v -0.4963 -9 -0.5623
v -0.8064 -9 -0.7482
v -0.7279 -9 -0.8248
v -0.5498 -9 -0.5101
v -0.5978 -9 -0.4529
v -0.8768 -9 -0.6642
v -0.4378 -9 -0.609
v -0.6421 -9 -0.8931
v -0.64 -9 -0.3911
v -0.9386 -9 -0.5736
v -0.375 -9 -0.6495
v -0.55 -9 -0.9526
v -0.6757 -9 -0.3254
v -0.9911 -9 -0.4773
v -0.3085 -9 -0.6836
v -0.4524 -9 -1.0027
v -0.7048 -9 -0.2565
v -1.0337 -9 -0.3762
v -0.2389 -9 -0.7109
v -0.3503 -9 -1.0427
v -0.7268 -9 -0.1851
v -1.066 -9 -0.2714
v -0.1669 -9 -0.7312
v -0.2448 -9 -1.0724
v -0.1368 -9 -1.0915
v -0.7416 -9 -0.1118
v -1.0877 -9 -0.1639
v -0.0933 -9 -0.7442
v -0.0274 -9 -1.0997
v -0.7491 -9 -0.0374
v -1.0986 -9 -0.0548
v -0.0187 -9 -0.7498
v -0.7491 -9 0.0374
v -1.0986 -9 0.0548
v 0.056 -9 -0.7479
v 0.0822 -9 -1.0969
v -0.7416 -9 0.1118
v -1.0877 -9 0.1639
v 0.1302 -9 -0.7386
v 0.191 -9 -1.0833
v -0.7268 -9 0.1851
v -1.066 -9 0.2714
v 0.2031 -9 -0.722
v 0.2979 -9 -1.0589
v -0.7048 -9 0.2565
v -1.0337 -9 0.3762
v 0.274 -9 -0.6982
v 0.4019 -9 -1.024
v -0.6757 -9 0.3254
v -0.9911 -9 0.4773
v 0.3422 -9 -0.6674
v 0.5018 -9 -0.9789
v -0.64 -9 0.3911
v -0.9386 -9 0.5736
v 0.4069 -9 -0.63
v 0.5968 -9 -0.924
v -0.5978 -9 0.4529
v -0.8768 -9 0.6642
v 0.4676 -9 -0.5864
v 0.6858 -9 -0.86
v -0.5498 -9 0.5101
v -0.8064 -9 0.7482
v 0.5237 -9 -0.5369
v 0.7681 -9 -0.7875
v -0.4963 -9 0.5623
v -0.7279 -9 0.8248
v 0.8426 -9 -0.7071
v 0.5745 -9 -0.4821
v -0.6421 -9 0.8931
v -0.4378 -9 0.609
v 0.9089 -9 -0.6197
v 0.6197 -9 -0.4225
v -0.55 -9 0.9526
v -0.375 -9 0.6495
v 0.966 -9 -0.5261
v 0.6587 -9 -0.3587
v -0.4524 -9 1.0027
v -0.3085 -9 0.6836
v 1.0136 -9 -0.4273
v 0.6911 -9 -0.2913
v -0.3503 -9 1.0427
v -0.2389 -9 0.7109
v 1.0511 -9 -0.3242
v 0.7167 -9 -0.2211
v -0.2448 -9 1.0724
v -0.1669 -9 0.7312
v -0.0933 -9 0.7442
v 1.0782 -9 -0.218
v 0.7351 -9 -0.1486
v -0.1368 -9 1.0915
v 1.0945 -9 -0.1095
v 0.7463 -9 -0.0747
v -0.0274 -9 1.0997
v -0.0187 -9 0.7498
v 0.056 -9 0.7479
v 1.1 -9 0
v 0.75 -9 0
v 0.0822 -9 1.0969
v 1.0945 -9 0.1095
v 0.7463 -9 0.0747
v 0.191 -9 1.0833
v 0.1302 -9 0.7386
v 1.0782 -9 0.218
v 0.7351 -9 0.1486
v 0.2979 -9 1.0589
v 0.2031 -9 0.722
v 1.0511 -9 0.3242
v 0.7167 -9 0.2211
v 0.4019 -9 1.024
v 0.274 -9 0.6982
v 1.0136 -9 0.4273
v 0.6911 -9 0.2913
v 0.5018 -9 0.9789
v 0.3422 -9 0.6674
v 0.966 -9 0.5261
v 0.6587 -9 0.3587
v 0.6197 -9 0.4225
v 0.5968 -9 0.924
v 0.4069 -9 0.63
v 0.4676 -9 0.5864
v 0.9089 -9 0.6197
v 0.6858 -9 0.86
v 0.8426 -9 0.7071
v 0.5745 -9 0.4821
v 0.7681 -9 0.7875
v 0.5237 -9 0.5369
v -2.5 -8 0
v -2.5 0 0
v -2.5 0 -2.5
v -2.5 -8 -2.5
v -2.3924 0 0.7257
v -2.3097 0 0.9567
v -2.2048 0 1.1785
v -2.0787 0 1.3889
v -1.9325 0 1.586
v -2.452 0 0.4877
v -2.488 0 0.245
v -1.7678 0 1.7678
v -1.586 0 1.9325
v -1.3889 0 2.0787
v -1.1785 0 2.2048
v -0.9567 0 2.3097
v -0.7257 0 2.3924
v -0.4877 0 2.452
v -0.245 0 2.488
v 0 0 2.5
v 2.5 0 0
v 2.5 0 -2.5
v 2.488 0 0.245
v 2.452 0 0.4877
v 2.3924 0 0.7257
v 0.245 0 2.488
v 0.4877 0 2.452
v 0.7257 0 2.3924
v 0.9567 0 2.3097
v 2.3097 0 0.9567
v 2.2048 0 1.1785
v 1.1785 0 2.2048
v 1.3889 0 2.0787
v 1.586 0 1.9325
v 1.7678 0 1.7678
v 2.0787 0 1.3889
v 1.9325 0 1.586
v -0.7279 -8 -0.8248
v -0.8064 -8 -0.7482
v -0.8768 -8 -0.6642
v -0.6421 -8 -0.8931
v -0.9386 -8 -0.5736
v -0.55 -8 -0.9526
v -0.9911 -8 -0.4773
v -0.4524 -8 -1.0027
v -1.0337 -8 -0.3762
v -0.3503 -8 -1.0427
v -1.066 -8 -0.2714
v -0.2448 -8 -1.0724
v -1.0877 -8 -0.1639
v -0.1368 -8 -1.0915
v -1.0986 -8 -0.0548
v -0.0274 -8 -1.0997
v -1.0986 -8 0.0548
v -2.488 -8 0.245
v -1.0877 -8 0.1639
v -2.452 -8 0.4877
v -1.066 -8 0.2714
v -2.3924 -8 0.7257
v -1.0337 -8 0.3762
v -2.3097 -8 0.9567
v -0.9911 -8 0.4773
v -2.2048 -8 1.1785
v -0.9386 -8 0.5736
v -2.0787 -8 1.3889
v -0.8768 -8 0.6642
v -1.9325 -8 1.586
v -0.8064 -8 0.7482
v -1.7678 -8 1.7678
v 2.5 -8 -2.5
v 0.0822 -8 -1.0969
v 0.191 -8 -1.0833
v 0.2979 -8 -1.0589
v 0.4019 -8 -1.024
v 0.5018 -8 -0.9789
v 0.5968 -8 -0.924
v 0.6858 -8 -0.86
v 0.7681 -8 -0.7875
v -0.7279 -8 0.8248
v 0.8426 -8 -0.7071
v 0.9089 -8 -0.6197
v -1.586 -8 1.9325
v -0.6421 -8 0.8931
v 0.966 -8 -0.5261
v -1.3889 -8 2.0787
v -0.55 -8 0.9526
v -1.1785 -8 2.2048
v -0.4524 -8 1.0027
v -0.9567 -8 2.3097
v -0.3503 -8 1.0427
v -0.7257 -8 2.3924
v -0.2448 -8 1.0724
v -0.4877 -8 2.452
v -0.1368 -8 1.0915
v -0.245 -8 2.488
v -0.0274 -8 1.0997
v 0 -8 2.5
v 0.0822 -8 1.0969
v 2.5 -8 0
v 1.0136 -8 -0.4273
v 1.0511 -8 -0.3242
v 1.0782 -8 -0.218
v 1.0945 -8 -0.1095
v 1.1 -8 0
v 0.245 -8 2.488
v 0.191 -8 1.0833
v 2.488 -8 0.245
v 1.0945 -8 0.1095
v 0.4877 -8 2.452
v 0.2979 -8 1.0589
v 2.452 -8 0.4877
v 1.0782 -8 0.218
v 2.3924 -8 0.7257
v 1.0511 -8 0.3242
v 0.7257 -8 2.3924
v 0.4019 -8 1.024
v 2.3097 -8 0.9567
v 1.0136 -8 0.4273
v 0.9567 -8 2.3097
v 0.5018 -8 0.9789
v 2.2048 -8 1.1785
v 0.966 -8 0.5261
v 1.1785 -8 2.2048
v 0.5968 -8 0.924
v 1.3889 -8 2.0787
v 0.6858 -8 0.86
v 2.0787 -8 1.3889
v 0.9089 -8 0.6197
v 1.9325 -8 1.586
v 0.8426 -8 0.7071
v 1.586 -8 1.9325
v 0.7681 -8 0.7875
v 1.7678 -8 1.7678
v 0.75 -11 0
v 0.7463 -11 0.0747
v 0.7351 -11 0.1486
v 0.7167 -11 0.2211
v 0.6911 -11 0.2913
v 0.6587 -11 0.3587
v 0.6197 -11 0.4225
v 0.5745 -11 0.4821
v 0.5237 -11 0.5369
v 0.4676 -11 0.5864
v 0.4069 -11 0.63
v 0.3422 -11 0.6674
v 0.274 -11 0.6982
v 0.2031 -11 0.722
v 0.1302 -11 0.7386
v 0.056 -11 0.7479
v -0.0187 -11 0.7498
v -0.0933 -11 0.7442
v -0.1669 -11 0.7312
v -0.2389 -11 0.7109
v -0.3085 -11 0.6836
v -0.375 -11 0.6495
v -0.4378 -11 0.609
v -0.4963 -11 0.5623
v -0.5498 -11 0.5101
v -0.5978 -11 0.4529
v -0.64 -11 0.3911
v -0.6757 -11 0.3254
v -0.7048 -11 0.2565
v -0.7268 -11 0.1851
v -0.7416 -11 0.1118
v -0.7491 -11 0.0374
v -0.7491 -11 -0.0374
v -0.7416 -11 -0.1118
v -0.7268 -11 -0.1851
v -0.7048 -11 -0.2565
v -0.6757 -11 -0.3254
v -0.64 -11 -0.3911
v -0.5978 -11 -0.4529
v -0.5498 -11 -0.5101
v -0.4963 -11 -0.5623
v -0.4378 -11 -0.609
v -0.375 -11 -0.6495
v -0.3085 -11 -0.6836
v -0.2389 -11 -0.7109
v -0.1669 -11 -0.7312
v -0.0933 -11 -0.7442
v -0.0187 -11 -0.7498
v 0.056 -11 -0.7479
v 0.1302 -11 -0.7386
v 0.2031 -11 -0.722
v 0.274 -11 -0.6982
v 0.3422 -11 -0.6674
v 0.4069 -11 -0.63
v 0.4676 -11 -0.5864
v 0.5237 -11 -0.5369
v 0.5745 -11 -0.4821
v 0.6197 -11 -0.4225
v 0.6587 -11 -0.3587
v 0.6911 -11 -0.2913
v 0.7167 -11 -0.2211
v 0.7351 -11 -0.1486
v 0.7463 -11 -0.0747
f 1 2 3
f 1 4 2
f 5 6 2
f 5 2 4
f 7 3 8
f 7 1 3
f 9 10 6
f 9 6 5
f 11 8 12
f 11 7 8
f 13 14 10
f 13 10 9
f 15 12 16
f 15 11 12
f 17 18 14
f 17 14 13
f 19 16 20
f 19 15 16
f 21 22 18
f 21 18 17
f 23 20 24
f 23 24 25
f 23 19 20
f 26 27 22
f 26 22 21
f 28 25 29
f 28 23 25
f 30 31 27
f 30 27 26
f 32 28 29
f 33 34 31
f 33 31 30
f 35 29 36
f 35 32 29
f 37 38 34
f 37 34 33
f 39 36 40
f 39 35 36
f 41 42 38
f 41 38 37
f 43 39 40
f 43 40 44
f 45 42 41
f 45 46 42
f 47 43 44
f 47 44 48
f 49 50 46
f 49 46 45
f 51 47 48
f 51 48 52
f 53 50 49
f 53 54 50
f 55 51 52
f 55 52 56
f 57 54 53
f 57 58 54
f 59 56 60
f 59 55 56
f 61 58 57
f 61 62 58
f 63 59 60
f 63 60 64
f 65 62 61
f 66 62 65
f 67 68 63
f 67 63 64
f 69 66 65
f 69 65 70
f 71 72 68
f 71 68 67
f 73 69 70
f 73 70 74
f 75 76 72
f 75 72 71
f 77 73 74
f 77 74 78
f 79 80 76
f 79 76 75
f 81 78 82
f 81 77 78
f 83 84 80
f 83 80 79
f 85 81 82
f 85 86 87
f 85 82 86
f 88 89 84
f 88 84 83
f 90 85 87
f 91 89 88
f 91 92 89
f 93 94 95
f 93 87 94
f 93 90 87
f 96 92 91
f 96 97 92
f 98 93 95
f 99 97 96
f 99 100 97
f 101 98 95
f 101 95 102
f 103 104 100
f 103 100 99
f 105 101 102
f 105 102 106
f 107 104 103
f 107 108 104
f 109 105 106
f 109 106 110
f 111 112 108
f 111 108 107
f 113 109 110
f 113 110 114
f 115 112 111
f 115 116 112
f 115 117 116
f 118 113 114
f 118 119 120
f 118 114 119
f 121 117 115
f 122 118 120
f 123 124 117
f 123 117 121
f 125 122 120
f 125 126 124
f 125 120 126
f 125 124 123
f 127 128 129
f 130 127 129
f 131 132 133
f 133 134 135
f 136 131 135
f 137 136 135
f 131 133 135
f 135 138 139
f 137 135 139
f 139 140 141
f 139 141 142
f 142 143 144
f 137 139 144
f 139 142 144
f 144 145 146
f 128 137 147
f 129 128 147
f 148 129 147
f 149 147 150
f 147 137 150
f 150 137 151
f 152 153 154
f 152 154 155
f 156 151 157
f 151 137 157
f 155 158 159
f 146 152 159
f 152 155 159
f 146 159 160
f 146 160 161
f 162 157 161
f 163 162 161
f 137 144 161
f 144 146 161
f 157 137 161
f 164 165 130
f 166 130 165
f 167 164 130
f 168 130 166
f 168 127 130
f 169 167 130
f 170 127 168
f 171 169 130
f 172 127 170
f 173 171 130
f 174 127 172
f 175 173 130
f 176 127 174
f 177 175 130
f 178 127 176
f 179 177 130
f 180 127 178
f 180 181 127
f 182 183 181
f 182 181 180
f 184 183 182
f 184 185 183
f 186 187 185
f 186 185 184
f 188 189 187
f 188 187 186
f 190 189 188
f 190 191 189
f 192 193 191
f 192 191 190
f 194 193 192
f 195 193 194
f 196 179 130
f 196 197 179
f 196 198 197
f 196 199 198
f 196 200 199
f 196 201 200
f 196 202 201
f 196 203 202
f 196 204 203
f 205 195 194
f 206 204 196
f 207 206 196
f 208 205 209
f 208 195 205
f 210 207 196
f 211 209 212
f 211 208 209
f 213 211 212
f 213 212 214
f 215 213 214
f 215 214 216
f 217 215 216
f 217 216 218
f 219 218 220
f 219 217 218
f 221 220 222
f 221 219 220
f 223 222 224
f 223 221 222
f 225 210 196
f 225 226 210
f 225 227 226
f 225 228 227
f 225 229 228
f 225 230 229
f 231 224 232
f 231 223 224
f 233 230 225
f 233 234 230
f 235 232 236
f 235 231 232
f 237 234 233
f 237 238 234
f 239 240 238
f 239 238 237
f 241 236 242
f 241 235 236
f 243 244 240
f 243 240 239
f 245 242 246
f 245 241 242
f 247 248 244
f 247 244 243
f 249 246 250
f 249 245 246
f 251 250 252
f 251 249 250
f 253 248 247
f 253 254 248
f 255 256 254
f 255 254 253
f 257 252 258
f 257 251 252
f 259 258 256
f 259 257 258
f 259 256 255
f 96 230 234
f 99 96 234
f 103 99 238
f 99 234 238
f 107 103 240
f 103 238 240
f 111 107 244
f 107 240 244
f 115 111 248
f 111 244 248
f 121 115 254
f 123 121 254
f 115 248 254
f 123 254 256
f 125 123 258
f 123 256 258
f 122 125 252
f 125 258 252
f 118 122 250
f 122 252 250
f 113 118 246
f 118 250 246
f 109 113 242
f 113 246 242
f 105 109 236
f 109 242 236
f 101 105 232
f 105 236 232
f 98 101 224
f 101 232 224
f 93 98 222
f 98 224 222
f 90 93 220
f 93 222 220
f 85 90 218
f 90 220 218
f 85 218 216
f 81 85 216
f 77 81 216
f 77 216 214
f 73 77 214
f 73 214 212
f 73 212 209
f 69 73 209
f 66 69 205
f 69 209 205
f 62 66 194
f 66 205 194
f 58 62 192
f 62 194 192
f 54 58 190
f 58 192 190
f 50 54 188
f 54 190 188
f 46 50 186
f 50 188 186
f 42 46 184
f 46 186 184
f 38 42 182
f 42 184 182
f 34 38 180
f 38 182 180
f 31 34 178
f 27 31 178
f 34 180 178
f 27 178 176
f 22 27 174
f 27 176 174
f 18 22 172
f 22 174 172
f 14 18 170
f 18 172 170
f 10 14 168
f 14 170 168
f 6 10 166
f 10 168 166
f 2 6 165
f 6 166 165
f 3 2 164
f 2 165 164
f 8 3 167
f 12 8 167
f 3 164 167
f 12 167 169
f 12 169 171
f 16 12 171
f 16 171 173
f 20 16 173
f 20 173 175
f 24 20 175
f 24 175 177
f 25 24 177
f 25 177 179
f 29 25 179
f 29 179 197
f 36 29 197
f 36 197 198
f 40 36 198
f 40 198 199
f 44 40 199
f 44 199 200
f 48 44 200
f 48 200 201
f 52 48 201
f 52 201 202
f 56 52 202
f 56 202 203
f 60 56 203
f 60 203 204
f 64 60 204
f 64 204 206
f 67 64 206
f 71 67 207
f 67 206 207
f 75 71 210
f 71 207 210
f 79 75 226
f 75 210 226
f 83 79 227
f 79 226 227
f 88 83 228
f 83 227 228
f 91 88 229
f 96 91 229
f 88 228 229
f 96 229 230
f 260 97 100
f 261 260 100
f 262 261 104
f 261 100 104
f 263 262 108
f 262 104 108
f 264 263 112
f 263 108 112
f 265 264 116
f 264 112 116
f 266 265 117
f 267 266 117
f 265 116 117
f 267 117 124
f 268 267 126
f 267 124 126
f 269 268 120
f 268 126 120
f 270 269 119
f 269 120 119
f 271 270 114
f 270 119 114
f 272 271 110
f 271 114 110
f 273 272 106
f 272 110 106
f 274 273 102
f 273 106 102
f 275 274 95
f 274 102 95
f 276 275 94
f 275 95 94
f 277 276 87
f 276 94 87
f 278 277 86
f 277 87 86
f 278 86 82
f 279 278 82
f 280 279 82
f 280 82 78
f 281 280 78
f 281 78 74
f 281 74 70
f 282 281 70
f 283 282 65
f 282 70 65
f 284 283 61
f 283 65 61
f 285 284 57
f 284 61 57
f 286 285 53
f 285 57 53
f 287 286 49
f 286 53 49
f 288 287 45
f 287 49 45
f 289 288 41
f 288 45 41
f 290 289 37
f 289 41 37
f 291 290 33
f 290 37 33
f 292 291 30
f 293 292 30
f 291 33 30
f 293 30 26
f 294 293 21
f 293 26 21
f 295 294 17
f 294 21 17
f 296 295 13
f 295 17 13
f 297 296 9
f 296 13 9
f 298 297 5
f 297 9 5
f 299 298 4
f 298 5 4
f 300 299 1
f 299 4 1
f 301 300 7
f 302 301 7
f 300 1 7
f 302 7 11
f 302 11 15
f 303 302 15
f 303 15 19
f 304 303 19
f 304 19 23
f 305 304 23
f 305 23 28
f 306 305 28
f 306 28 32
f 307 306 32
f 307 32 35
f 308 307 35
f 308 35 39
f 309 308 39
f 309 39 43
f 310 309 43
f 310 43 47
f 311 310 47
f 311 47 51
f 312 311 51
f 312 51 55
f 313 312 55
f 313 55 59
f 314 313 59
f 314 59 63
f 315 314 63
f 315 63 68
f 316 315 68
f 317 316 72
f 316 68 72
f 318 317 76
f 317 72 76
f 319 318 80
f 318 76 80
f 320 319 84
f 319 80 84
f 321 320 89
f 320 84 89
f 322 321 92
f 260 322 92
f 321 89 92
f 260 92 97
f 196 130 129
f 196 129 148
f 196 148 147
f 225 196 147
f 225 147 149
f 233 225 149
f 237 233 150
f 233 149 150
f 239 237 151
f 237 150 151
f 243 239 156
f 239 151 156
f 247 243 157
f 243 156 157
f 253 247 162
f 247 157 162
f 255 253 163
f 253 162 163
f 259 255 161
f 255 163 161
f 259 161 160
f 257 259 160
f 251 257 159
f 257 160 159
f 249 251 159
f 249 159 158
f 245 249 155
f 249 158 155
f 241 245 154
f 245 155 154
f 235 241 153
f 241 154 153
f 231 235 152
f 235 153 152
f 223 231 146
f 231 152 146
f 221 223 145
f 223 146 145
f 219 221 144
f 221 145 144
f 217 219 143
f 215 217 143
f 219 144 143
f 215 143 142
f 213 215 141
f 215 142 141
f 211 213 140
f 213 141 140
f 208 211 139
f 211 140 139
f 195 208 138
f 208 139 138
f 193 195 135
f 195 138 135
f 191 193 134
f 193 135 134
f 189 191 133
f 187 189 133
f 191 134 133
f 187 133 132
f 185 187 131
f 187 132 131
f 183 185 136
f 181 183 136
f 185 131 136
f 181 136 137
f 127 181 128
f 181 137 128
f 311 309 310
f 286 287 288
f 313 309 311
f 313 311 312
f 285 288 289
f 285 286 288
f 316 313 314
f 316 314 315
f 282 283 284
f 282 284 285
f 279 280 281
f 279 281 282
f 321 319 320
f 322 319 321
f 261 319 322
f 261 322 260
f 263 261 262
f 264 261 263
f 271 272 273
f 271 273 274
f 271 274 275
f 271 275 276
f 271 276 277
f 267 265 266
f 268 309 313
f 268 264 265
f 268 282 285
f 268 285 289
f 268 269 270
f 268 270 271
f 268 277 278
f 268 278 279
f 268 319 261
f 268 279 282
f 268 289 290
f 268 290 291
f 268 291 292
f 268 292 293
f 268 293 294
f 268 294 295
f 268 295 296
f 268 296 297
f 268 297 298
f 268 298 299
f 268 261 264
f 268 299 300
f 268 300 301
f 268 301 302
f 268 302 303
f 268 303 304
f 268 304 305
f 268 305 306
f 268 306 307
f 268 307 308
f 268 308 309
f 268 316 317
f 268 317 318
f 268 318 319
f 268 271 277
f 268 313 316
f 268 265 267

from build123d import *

# Parameters (mm, degrees)
F1_DEPTH = 8
F2_R     = 1.1
F3_DEPTH = 1
F4_R     = 0.75
F5_DEPTH = 2


with BuildPart() as f1:
    # F0 (on Front) → F1 (new body)
    with BuildSketch(Plane.XZ):
        with BuildLine():
            ThreePointArc((2.5, 0), (0, 2.5), (-2.5, 0))
            Line((-2.5, 0), (-2.5, -2.5))
            Line((-2.5, -2.5), (2.5, -2.5))
            Line((2.5, -2.5), (2.5, 0))
        make_face()
    extrude(amount=F1_DEPTH)

    # F2 (on face) → F3 (join)
    with BuildSketch(Plane.XZ.offset(8)):
        Circle(F2_R)
    extrude(amount=F3_DEPTH)

    # F4 (on face) → F5 (join)
    with BuildSketch(Plane.XZ.offset(9)):
        Circle(F4_R)
    extrude(amount=F5_DEPTH)


solid = f1.part
